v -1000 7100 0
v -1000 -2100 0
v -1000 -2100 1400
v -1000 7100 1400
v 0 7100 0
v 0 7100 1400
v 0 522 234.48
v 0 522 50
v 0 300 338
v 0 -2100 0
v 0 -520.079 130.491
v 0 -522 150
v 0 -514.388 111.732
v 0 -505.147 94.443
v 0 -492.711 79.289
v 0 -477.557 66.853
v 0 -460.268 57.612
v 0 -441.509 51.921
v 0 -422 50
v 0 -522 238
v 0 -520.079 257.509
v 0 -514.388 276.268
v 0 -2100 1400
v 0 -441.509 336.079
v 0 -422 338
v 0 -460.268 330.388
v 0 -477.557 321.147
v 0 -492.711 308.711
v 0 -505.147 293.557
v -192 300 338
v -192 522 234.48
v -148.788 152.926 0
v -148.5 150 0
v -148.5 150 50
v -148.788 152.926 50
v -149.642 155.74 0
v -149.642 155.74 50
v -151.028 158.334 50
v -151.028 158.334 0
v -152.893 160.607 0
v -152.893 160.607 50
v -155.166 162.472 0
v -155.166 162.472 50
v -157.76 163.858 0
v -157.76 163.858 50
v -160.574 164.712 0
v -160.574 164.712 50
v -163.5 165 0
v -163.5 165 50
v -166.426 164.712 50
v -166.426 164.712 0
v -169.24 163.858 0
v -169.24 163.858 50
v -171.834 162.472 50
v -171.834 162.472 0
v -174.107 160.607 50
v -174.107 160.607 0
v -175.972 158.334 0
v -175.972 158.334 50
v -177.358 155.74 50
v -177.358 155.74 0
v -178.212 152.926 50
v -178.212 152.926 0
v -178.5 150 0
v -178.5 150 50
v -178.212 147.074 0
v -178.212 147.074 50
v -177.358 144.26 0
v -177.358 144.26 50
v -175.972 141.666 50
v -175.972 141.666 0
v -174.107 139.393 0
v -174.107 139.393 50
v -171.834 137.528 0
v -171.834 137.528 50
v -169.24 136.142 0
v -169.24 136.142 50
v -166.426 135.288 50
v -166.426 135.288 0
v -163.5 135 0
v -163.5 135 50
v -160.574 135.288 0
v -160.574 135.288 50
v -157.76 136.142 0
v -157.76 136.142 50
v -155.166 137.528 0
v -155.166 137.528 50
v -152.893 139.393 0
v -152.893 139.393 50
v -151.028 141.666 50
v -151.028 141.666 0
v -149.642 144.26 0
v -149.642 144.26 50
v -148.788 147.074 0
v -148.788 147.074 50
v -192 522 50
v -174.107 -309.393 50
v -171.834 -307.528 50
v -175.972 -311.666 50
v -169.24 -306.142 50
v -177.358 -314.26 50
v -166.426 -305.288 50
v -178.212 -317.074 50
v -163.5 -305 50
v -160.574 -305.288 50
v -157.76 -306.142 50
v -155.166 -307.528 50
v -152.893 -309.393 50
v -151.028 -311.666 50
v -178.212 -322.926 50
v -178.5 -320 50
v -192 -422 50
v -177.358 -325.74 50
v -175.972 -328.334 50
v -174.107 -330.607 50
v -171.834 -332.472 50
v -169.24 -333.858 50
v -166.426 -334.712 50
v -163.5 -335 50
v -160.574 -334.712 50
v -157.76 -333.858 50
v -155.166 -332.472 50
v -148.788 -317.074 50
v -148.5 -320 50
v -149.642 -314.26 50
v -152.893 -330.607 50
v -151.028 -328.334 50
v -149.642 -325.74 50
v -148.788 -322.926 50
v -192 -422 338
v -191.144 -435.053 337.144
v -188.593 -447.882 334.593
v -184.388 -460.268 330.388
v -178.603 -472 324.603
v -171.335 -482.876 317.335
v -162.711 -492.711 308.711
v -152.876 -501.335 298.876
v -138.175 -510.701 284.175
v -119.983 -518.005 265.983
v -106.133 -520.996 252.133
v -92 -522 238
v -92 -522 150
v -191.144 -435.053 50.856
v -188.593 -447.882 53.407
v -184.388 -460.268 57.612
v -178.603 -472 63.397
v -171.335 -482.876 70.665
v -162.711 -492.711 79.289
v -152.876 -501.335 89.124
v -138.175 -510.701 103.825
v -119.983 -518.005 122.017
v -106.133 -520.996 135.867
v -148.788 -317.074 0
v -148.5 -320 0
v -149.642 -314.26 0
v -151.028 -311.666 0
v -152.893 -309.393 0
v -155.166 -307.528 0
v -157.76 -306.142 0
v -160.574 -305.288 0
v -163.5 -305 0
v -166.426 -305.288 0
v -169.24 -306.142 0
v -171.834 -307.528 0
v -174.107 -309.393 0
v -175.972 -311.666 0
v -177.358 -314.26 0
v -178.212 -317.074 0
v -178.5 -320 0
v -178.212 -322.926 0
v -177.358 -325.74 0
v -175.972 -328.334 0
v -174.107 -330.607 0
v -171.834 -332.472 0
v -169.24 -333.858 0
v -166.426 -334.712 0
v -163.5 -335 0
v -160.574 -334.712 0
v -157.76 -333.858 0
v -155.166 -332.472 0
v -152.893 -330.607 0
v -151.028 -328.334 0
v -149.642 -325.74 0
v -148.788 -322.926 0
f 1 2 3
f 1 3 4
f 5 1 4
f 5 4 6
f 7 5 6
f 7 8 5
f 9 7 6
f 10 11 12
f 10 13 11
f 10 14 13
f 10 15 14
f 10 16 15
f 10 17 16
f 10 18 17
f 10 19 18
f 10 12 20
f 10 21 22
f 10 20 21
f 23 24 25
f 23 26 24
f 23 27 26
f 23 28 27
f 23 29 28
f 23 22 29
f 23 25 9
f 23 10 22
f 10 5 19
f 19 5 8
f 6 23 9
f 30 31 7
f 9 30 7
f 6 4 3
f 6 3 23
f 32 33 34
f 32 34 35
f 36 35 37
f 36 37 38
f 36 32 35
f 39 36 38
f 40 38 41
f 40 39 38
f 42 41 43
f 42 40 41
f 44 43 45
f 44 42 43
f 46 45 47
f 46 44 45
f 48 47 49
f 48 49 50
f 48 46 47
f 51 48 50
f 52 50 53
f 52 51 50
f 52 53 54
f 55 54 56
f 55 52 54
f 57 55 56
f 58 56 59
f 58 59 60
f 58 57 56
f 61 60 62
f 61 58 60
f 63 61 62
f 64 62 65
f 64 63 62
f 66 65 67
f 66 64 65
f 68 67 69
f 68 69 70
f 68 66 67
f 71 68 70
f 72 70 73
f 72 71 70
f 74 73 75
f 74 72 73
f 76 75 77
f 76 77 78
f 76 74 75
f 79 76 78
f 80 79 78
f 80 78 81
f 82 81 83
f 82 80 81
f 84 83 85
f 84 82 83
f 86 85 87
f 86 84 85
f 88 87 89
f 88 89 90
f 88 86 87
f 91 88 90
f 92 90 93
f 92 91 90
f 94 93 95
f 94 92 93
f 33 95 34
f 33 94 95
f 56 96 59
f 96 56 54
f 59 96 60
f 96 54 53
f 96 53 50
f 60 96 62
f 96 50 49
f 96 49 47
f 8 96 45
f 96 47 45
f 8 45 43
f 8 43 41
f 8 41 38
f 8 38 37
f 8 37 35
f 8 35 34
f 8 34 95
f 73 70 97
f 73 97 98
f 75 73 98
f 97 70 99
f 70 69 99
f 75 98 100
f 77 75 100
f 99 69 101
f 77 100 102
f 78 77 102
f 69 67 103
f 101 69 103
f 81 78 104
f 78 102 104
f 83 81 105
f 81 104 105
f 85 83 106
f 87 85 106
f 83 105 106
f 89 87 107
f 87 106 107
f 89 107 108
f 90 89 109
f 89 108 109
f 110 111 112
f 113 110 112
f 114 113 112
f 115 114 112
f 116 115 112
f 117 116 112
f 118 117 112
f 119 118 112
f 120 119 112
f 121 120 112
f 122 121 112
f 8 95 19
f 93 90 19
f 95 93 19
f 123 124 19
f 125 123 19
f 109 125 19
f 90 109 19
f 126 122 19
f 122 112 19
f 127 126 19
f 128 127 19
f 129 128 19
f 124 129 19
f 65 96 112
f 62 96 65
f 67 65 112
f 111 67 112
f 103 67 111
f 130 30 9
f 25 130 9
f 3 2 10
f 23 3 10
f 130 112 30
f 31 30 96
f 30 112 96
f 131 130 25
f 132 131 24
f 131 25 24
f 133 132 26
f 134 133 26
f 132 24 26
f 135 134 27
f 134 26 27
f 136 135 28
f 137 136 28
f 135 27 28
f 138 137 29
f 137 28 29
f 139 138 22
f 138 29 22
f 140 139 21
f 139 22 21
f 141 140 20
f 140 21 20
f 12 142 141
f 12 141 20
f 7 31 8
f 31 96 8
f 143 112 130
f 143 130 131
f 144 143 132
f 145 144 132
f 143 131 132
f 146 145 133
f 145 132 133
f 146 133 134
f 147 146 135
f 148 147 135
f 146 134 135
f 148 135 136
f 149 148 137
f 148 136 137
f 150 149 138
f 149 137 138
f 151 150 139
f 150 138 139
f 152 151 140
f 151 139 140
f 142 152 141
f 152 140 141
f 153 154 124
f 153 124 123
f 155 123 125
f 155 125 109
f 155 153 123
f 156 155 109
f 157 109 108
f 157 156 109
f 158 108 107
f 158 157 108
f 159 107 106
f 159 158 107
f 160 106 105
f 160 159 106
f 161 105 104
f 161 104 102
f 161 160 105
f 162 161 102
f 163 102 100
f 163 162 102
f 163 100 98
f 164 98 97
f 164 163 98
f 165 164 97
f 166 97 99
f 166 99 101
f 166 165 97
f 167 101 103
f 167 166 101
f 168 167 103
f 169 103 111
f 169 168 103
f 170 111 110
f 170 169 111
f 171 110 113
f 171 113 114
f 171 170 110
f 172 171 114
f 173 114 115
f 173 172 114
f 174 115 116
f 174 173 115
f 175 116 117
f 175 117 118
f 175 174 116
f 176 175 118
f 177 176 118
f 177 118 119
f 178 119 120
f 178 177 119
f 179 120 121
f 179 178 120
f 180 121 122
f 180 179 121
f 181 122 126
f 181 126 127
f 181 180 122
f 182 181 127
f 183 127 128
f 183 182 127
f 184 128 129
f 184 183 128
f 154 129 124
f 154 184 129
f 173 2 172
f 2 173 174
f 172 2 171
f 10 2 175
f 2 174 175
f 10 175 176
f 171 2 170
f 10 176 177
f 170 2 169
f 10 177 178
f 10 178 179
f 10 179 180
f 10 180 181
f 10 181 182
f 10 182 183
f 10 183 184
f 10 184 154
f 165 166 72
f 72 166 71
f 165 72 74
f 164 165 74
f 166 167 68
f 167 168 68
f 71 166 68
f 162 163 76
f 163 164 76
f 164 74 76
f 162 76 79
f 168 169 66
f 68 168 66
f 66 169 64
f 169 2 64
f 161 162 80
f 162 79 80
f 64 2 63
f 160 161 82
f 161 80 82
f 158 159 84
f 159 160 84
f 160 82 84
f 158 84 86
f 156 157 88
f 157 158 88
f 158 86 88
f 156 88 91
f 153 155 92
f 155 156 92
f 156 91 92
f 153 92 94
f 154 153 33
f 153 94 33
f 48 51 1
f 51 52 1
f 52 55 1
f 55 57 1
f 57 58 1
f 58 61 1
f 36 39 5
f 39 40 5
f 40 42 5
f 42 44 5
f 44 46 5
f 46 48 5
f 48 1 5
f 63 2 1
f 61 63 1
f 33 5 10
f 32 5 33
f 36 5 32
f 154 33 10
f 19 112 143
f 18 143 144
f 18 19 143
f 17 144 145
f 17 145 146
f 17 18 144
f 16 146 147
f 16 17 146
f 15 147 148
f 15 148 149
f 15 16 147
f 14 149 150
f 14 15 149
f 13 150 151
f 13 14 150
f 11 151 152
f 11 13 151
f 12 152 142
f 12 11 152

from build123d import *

# Parameters (mm, degrees)
F0_W      = 384
F0_H      = 1044
F1_DEPTH  = 338
F2_W      = 384
F2_H      = 50
F3_DEPTH  = 1044.001
F4_R      = 100
F5_SIZE2  = 103.5203001104
F5_SIZE   = 222
F6_R      = 15
F7_DEPTH  = 50
F8_W      = 2000
F8_H      = 9200
F9_DEPTH  = 1400
F11_W     = 1000
F11_H     = 1400
F12_DEPTH = 9200.001


with BuildPart() as f1:
    # F0 (on Top) → F1 (new body)
    with BuildSketch(Plane.XY):
        Rectangle(F0_W, F0_H)
    extrude(amount=F1_DEPTH)

    # F2 (on face) → F3 (cut, through all)
    with BuildSketch(Plane.XZ.offset(522)):
        with Locations((0, 25)):
            Rectangle(F2_W, F2_H)
    extrude(amount=-F3_DEPTH, mode=Mode.SUBTRACT)

    # F4
    f4_edges = [f1.edges().sort_by_distance(p)[0] for p in [
        (-192, -522, 194),
        (0, -522, 338),
        (192, -522, 194),
        (0, -522, 50),
    ]]
    fillet(f4_edges, radius=F4_R)

    # F5
    f5_edges = [f1.edges().sort_by_distance(p)[0] for p in [
        (0, 522, 338),
    ]]
    f5_side = f1.faces().sort_by_distance((0, 50, 338))[0]
    chamfer(f5_edges, length=F5_SIZE, length2=F5_SIZE2, reference=f5_side)

    # F6 (on Top) → F7 (join, through all)
    with BuildSketch(Plane.XY):
        with Locations((163.5, -320)):
            Circle(F6_R)
        with Locations((163.5, 150)):
            Circle(F6_R)
        with Locations((-163.5, 150)):
            Circle(F6_R)
        with Locations((-163.5, -320)):
            Circle(F6_R)
    extrude(amount=F7_DEPTH)


with BuildPart() as f9:
    # F8 (on Top) → F9 (new body)
    with BuildSketch(Plane.XY):
        with Locations((0, 2500)):
            Rectangle(F8_W, F8_H)
    extrude(amount=F9_DEPTH)

    # F10: cut F1
    add(f1.part, mode=Mode.SUBTRACT)

    # F11 (on face) → F12 (cut, through all)
    with BuildSketch(Plane.XZ.offset(2100)):
        with Locations((500, 700)):
            Rectangle(F11_W, F11_H)
    extrude(amount=-F12_DEPTH, mode=Mode.SUBTRACT)


solid = f9.part
